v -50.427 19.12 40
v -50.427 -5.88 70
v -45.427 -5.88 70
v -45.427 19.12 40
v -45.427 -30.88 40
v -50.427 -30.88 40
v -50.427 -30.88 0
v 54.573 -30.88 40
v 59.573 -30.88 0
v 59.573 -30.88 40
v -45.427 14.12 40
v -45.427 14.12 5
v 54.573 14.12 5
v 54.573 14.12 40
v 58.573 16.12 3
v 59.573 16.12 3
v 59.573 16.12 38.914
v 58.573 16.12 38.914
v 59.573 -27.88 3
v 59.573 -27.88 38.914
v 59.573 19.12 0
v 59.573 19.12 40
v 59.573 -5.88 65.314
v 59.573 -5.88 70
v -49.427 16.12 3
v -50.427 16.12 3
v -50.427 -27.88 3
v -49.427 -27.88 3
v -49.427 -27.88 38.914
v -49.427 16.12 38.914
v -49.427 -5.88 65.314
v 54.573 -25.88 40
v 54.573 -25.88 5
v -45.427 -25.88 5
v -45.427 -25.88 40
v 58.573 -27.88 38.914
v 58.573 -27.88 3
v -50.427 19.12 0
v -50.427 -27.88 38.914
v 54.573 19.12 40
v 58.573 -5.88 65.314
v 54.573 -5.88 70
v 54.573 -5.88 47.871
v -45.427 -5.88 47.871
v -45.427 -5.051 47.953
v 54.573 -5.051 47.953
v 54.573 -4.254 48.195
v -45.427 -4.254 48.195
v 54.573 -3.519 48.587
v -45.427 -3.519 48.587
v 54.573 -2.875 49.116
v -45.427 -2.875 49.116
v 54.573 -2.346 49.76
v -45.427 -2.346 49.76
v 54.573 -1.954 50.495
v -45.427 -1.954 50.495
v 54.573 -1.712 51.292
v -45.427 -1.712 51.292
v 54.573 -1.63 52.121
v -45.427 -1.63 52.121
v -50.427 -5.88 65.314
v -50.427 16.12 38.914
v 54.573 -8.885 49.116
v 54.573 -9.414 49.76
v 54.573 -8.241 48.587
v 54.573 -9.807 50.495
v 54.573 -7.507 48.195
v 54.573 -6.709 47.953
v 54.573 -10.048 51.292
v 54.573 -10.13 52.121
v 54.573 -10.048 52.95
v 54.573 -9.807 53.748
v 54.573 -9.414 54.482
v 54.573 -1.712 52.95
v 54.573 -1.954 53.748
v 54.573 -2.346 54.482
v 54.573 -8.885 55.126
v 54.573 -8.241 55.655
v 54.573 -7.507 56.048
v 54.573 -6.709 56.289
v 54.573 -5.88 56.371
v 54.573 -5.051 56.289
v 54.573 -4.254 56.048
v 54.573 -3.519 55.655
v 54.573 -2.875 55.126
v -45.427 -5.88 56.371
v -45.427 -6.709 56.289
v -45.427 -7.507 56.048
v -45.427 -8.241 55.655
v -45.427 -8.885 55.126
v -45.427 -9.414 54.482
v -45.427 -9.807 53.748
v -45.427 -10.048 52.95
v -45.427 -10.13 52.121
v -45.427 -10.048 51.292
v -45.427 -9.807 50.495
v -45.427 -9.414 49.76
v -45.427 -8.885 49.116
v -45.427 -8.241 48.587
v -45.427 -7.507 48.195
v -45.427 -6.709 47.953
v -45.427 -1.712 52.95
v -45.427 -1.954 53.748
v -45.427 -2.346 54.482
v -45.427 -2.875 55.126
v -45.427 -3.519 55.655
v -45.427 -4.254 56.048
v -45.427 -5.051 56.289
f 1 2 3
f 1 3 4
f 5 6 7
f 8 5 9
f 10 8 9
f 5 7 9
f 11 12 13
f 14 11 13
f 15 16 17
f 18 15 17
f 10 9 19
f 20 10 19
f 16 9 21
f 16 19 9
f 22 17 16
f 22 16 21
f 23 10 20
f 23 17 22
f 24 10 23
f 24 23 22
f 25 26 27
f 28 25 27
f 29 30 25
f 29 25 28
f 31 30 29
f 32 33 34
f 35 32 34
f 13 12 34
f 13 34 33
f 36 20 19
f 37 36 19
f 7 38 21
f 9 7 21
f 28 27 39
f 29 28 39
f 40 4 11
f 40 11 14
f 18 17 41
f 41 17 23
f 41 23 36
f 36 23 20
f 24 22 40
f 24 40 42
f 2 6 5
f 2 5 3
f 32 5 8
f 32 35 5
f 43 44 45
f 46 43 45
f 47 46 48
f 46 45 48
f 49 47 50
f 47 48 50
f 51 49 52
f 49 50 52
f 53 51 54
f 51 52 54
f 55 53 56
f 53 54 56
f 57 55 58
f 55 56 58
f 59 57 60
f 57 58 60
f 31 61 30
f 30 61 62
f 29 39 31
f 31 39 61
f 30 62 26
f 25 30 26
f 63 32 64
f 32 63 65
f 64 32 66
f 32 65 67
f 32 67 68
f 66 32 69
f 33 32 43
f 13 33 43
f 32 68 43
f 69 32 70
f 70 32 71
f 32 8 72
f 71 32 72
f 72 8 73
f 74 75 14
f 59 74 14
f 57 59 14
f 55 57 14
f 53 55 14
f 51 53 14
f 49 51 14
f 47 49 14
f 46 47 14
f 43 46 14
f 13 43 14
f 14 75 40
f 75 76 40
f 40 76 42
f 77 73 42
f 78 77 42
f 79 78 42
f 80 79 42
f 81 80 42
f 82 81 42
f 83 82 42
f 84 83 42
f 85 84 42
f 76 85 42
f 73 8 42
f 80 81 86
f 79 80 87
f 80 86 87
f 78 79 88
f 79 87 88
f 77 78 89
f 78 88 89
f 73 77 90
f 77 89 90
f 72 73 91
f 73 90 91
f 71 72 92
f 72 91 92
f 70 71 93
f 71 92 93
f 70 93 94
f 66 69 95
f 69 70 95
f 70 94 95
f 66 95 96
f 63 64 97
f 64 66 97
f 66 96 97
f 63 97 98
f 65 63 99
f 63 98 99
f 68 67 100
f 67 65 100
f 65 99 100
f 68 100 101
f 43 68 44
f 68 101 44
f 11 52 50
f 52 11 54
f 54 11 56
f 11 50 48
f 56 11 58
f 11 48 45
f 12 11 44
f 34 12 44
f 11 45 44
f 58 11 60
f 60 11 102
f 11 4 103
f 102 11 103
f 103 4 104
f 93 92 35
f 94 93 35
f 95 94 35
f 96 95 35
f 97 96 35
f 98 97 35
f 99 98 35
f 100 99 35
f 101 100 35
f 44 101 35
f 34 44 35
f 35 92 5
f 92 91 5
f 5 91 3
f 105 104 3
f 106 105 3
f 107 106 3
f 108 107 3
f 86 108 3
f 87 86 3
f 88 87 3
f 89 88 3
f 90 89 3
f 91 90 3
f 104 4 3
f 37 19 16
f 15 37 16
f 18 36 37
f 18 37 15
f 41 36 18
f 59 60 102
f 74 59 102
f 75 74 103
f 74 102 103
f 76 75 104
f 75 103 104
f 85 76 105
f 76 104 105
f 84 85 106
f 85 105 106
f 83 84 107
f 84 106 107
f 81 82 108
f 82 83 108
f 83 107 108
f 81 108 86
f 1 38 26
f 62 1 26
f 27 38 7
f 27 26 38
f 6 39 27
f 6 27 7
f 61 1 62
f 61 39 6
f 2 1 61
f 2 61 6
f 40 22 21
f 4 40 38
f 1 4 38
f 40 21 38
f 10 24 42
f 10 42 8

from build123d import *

# Parameters (mm, degrees)
F0_W      = 110
F0_H      = 50
F1_DEPTH  = 5
F2_W      = 5
F2_H      = 40
F3_DEPTH  = 35
F5_DEPTH  = 5
F7_DEPTH  = 5
F9_DEPTH  = 101
F11_DEPTH = 1
F13_DEPTH = 1


with BuildPart() as f1:
    # F0 (on Top) → F1 (new body)
    with BuildSketch(Plane.XY):
        with Locations((4.572784, -5.880122)):
            Rectangle(F0_W, F0_H)
    extrude(amount=F1_DEPTH)

    # F2 (on face) → F3 (join)
    with BuildSketch(Plane.XY.offset(5)):
        Polygon((59.572784, 19.119878), (-50.427216, 19.119878), (-50.427216, 14.119878), (-45.427216, 14.119878), (54.572784, 14.119878), (59.572784, 14.119878), align=None)
        with Locations((-47.927216, -5.880122)):
            Rectangle(F2_W, F2_H)
        with Locations((57.072784, -5.880122)):
            Rectangle(F2_W, F2_H)
        Polygon((-45.427216, -25.880122), (-50.427216, -25.880122), (-50.427216, -30.880122), (59.572784, -30.880122), (59.572784, -25.880122), (54.572784, -25.880122), align=None)
    extrude(amount=F3_DEPTH)

    # F4 (on face) → F5 (join)
    with BuildSketch(Plane(origin=(-50.427216, 0, 0), x_dir=(0, -1, 0), z_dir=(-1, 0, 0))):
        Polygon((30.880122, 40), (5.880122, 70), (5.880122, 40), align=None)
        Polygon((5.880122, 70), (-19.119878, 40), (5.880122, 40), align=None)
    extrude(amount=-F5_DEPTH)

    # F6 (on face) → F7 (join)
    with BuildSketch(Plane.YZ.offset(59.572784)):
        Polygon((-30.880122, 40), (-5.880122, 40), (-5.880122, 70), align=None)
        Polygon((-5.880122, 70), (-5.880122, 40), (19.119878, 40), align=None)
    extrude(amount=-F7_DEPTH)

    # F8 (on face) → F9 (join)
    with BuildSketch(Plane.YZ.offset(-45.427216)):
        with BuildLine():
            ThreePointArc((-1.630122, 52.12112), (-2.874919, 55.126323), (-5.880122, 56.37112))
            Line((-5.880122, 56.37112), (-5.880122, 47.87112))
            ThreePointArc((-5.880122, 47.87112), (-2.874919, 49.115916), (-1.630122, 52.12112))
        make_face()
        with BuildLine():
            Line((-5.880122, 47.87112), (-5.880122, 56.37112))
            ThreePointArc((-5.880122, 56.37112), (-10.130122, 52.12112), (-5.880122, 47.87112))
        make_face()
    extrude(amount=F9_DEPTH)

    # F10 (on face) → F11 (cut)
    with BuildSketch(Plane.YZ.offset(59.572784)):
        Polygon((-27.880122, 38.91385), (-27.880122, 3), (16.119878, 3), (16.119878, 38.91385), (-5.880122, 65.31385), align=None)
    extrude(amount=-F11_DEPTH, mode=Mode.SUBTRACT)

    # F12 (on face) → F13 (cut)
    with BuildSketch(Plane(origin=(-50.427216, 0, 0), x_dir=(0, -1, 0), z_dir=(-1, 0, 0))):
        Polygon((-16.119878, 38.91385), (-16.119878, 3), (27.880122, 3), (27.880122, 38.91385), (5.880122, 65.31385), align=None)
    extrude(amount=-F13_DEPTH, mode=Mode.SUBTRACT)


solid = f1.part
